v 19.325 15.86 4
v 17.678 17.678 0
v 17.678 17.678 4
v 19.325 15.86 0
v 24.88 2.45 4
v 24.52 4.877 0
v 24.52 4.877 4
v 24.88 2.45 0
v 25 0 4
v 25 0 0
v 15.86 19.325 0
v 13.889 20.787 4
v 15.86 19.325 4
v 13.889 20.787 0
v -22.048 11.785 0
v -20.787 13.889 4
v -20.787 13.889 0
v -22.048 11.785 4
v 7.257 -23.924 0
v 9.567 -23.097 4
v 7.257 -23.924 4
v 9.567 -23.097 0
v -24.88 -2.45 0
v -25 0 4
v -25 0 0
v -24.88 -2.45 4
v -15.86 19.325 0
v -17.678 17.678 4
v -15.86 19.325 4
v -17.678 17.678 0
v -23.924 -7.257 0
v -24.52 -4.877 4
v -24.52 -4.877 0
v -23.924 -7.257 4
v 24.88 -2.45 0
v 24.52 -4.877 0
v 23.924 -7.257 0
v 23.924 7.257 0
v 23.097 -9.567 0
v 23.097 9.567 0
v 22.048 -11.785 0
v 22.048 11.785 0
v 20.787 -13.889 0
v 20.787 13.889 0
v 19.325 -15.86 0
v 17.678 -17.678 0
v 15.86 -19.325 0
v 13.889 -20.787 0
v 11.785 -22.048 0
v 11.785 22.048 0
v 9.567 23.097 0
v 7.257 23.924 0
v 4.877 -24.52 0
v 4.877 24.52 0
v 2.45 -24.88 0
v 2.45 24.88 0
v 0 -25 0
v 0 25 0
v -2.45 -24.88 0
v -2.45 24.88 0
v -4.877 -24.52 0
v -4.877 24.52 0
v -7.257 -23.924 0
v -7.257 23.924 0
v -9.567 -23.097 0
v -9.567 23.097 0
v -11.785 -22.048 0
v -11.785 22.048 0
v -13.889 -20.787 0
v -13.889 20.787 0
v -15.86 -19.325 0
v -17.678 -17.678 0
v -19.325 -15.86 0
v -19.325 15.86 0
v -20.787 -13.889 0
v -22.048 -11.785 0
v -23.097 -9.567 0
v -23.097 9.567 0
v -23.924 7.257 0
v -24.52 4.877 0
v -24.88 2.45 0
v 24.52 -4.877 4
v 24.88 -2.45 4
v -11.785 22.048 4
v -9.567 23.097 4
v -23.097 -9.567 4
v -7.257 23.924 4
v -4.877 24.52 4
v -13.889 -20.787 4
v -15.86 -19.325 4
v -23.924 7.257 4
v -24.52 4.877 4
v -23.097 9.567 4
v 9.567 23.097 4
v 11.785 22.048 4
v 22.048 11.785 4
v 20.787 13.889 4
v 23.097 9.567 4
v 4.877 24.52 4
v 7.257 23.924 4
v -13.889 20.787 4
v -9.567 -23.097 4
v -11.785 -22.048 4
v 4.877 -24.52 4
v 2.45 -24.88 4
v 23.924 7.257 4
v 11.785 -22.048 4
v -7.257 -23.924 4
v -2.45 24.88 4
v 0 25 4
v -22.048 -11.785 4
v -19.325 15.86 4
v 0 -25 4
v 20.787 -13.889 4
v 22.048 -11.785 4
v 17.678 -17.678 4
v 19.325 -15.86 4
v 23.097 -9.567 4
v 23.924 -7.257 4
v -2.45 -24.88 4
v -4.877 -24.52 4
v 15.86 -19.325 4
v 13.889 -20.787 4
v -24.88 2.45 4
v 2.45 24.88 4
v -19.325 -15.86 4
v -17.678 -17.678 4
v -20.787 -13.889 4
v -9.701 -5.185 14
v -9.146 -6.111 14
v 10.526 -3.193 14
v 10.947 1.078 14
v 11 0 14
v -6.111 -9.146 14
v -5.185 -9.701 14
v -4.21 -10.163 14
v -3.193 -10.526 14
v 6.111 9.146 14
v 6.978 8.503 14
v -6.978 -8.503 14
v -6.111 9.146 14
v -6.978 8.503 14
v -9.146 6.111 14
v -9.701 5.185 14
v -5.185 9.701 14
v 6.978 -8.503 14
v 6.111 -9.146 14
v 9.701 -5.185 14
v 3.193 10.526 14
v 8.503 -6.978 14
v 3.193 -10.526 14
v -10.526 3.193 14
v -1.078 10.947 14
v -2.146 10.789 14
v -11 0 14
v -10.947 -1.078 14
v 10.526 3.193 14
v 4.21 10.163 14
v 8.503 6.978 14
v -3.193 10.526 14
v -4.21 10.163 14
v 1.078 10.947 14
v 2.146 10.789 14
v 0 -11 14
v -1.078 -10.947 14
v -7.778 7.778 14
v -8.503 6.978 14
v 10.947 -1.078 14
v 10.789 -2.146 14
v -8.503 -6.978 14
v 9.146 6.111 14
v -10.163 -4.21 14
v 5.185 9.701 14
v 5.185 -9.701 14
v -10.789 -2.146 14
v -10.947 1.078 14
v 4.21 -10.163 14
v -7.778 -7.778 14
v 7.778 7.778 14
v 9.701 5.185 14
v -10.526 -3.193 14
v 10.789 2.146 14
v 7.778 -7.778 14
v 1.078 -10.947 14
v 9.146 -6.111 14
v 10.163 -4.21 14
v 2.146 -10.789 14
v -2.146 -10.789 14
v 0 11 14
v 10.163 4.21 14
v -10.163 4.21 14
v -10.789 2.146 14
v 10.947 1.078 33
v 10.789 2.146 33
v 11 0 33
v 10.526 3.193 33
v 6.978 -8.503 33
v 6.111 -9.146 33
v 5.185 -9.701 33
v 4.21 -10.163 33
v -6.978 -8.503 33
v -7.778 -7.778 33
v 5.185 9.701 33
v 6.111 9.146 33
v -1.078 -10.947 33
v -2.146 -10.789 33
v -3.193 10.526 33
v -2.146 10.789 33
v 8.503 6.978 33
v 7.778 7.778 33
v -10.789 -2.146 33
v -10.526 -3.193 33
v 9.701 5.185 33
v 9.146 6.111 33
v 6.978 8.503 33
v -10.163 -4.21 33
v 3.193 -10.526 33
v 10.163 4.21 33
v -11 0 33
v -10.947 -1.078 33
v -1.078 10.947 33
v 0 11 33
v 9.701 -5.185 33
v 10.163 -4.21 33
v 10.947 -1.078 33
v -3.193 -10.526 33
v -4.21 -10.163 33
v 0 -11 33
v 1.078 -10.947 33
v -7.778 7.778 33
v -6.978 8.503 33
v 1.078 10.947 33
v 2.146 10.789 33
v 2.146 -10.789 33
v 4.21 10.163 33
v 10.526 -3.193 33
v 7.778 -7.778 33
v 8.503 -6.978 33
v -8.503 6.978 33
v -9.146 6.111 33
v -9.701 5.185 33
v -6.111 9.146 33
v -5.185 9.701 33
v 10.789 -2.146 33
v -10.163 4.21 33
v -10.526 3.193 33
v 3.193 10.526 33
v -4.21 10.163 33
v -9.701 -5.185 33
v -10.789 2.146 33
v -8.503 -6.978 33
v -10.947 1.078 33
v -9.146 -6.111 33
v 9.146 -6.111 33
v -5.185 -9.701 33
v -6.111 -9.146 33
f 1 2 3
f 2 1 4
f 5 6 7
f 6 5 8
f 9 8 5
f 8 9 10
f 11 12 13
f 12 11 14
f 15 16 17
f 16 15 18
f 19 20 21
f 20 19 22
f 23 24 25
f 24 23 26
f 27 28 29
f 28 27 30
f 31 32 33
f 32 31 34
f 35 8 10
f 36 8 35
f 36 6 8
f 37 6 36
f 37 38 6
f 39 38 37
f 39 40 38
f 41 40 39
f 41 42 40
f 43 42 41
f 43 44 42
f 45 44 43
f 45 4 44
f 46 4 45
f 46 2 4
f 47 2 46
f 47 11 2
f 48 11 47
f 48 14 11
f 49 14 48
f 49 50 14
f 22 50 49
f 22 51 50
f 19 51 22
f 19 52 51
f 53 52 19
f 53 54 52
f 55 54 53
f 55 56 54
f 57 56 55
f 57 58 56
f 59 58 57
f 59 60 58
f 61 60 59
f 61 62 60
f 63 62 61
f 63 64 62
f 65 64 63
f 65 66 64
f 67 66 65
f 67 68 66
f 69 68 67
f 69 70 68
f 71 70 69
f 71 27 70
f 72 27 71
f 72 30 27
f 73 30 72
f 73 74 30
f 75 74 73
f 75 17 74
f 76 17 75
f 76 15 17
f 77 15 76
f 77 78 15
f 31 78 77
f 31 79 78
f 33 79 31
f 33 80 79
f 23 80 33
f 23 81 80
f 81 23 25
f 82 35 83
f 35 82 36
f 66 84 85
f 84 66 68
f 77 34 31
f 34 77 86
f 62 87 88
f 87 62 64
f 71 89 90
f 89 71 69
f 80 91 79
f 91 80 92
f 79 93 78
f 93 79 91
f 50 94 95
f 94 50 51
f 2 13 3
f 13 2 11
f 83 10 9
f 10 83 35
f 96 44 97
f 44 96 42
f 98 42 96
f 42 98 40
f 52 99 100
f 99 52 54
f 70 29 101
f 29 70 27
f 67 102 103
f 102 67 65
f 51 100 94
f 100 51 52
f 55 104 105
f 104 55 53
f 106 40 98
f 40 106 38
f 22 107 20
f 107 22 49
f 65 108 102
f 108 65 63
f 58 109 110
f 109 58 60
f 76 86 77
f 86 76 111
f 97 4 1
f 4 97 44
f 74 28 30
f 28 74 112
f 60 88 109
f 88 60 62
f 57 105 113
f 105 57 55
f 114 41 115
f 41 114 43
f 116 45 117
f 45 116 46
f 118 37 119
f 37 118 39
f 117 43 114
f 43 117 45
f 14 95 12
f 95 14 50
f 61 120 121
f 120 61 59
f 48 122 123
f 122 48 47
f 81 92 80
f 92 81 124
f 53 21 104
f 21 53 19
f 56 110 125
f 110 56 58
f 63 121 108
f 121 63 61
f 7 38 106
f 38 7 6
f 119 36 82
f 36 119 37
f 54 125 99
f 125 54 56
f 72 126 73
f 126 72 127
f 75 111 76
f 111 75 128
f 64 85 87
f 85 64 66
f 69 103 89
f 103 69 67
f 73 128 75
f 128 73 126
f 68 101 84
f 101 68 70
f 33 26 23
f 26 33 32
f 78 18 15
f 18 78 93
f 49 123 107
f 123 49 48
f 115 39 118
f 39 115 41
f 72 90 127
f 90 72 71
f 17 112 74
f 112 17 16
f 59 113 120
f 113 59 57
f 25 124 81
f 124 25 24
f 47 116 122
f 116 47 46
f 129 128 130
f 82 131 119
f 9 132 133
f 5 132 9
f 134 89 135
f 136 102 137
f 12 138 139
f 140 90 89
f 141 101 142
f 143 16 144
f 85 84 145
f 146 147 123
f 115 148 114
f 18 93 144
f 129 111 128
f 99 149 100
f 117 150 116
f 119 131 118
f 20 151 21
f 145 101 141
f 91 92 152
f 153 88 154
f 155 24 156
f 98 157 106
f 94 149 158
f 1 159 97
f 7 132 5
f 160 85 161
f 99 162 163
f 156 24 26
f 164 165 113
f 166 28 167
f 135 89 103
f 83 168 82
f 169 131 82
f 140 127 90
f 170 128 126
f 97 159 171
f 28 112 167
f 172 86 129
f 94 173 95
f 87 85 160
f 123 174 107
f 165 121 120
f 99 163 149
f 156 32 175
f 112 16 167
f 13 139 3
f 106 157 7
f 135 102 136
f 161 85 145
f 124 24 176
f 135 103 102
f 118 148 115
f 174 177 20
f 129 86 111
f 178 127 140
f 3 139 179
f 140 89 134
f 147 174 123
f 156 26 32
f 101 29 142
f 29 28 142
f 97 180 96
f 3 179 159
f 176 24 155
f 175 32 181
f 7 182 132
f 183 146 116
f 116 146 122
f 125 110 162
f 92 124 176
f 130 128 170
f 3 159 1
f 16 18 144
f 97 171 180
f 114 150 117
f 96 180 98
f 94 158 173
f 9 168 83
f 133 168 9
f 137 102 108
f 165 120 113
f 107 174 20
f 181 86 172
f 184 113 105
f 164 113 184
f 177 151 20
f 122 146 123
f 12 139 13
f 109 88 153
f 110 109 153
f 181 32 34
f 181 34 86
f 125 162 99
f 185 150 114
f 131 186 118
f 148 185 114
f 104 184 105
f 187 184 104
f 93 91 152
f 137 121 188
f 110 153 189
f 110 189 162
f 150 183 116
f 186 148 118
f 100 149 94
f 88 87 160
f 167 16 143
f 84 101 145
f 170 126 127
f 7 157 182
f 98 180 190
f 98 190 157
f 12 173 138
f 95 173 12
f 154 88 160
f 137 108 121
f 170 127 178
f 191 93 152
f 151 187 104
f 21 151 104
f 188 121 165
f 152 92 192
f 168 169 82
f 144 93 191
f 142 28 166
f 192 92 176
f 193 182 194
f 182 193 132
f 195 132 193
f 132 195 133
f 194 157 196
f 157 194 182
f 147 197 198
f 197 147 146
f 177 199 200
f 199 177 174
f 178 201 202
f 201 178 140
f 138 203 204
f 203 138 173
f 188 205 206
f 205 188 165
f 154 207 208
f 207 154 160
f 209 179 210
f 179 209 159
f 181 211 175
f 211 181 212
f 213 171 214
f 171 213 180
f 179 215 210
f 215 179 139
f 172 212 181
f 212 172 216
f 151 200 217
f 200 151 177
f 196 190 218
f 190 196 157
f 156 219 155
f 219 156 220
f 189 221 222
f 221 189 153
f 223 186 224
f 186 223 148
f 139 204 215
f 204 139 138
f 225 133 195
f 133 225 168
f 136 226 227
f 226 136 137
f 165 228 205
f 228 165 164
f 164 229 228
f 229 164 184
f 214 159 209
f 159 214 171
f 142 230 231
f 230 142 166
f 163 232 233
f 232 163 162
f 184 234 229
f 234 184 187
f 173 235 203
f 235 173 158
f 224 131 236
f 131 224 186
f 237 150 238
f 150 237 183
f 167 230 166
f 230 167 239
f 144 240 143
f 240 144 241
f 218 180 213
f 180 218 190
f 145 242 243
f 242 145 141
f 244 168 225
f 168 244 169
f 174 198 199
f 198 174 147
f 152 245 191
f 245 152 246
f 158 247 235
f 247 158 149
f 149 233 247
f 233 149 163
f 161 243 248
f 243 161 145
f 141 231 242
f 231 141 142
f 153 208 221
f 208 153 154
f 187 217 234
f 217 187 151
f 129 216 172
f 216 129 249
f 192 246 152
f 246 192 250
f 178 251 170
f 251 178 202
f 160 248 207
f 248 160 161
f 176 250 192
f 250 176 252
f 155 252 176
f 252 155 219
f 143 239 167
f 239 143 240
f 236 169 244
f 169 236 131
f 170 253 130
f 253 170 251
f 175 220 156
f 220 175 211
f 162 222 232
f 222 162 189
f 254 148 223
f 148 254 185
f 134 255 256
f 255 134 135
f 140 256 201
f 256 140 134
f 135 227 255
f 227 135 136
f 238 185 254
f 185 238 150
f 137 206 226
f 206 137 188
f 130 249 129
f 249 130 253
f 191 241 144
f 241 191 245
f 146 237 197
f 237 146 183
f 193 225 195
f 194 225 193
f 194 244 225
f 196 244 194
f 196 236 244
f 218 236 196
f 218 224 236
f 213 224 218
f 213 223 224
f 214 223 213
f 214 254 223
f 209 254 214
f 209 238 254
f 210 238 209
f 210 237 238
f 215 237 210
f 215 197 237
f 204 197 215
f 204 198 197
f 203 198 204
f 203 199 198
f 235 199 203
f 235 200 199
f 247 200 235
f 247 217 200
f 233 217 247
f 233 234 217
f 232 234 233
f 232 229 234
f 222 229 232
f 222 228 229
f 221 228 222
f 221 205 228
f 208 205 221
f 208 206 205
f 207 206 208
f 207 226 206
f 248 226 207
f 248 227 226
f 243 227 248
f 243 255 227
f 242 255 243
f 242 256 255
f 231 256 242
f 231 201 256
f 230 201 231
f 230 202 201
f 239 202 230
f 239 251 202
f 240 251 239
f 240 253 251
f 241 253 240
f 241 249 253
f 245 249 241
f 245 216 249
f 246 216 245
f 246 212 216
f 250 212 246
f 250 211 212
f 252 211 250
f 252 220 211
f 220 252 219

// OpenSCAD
// Dimensions (mm) - measured with calipers
base_dia = 50;
base_h = 4;
cone_top_dia = 50;
cone_bot_dia = 22;
cone_h = 10; // z=4 to z=14
col_dia = 22;
col_h = 19; // z=14 to z=33
seat_dia = 11;
seat_h = 10; // z=33 down to z=23
tip_dia = 3;
tip_z = 6;
window_w = 4;
window_z1 = 18;
window_z2 = 30;

$fn = 64;

// Build the solid parts
union() {
    // Base disc
    translate([0, 0, 0])
        cylinder(h = base_h, r = base_dia / 2, center = false);

    // Cone
    translate([0, 0, base_h])
        cylinder(h = cone_h, r1 = cone_top_dia / 2, r2 = cone_bot_dia / 2, center = false);

    // Column
    translate([0, 0, base_h + cone_h])
        cylinder(h = col_h, r = col_dia / 2, center = false);

    // Tube seat (cylindrical part)
    // From z=33 down to z=23
    translate([0, 0, base_h + cone_h + col_h - seat_h])
        cylinder(h = seat_h, r = seat_dia / 2, center = false);

    // Tube seat (conical tip part)
    // From z=23 down to z=6, diameter goes from 11 to 3
    cone_seat_h = 23 - tip_z; // 17 mm
    translate([0, 0, tip_z])
        cylinder(h = cone_seat_h, r1 = tip_dia / 2, r2 = seat_dia / 2, center = false);
}

// Subtract the viewing window
// The window is on the +X side, so we place the cut box at positive X
// It goes from the inner surface (seat_dia/2) to beyond the outer surface (col_dia/2 + 1mm)
// Y is centered at 0, width 4 mm
// Z from window_z1 to window_z2
difference() {
    // Empty placeholder to satisfy syntax if needed, but the main solid is already built above.
    // Actually, the previous union() is separate. We need to combine them properly.
    // Let's restructure: Build solid, then subtract window.
}

// Correct structure:
// 1. Define the solid
// 2. Subtract the window from it

// We will rebuild the logic cleanly below.

// Solid definition
module stand_solid() {
    // Base disc
    translate([0, 0, 0])
        cylinder(h = base_h, r = base_dia / 2, center = false);

    // Cone
    translate([0, 0, base_h])
        cylinder(h = cone_h, r1 = cone_top_dia / 2, r2 = cone_bot_dia / 2, center = false);

    // Column
    translate([0, 0, base_h + cone_h])
        cylinder(h = col_h, r = col_dia / 2, center = false);

    // Tube seat (cylindrical part)
    // From z=33 down to z=23
    translate([0, 0, base_h + cone_h + col_h - seat_h])
        cylinder(h = seat_h, r = seat_dia / 2, center = false);

    // Tube seat (conical tip part)
    // From z=23 down to z=6, diameter goes from 11 to 3
    cone_seat_h = 23 - tip_z; // 17 mm
    translate([0, 0, tip_z])
        cylinder(h = cone_seat_h, r1 = tip_dia / 2, r2 = seat_dia / 2, center = false);
}

// Final assembly
difference() {
    stand_solid();
    
    // Viewing window cut
    // Cut through the column wall on +X side
    // Window is 4 mm wide in Y, from z=18 to z=30
    // It goes from the seat (inner radius) to the outside (outer radius)
    // Inner radius = seat_dia/2 = 5.5 mm
    // Outer radius = col_dia/2 = 11 mm
    // So the cut extends from x = 5.5 to x = 11 (and beyond to ensure clean cut)
    // Centered in Y at 0, width 4 mm means Y from -2 to +2
    
    translate([seat_dia / 2, -window_w / 2, window_z1])
        cube([col_dia / 2 - seat_dia / 2 + 1, window_w, window_z2 - window_z1 + 0.01]);
}
